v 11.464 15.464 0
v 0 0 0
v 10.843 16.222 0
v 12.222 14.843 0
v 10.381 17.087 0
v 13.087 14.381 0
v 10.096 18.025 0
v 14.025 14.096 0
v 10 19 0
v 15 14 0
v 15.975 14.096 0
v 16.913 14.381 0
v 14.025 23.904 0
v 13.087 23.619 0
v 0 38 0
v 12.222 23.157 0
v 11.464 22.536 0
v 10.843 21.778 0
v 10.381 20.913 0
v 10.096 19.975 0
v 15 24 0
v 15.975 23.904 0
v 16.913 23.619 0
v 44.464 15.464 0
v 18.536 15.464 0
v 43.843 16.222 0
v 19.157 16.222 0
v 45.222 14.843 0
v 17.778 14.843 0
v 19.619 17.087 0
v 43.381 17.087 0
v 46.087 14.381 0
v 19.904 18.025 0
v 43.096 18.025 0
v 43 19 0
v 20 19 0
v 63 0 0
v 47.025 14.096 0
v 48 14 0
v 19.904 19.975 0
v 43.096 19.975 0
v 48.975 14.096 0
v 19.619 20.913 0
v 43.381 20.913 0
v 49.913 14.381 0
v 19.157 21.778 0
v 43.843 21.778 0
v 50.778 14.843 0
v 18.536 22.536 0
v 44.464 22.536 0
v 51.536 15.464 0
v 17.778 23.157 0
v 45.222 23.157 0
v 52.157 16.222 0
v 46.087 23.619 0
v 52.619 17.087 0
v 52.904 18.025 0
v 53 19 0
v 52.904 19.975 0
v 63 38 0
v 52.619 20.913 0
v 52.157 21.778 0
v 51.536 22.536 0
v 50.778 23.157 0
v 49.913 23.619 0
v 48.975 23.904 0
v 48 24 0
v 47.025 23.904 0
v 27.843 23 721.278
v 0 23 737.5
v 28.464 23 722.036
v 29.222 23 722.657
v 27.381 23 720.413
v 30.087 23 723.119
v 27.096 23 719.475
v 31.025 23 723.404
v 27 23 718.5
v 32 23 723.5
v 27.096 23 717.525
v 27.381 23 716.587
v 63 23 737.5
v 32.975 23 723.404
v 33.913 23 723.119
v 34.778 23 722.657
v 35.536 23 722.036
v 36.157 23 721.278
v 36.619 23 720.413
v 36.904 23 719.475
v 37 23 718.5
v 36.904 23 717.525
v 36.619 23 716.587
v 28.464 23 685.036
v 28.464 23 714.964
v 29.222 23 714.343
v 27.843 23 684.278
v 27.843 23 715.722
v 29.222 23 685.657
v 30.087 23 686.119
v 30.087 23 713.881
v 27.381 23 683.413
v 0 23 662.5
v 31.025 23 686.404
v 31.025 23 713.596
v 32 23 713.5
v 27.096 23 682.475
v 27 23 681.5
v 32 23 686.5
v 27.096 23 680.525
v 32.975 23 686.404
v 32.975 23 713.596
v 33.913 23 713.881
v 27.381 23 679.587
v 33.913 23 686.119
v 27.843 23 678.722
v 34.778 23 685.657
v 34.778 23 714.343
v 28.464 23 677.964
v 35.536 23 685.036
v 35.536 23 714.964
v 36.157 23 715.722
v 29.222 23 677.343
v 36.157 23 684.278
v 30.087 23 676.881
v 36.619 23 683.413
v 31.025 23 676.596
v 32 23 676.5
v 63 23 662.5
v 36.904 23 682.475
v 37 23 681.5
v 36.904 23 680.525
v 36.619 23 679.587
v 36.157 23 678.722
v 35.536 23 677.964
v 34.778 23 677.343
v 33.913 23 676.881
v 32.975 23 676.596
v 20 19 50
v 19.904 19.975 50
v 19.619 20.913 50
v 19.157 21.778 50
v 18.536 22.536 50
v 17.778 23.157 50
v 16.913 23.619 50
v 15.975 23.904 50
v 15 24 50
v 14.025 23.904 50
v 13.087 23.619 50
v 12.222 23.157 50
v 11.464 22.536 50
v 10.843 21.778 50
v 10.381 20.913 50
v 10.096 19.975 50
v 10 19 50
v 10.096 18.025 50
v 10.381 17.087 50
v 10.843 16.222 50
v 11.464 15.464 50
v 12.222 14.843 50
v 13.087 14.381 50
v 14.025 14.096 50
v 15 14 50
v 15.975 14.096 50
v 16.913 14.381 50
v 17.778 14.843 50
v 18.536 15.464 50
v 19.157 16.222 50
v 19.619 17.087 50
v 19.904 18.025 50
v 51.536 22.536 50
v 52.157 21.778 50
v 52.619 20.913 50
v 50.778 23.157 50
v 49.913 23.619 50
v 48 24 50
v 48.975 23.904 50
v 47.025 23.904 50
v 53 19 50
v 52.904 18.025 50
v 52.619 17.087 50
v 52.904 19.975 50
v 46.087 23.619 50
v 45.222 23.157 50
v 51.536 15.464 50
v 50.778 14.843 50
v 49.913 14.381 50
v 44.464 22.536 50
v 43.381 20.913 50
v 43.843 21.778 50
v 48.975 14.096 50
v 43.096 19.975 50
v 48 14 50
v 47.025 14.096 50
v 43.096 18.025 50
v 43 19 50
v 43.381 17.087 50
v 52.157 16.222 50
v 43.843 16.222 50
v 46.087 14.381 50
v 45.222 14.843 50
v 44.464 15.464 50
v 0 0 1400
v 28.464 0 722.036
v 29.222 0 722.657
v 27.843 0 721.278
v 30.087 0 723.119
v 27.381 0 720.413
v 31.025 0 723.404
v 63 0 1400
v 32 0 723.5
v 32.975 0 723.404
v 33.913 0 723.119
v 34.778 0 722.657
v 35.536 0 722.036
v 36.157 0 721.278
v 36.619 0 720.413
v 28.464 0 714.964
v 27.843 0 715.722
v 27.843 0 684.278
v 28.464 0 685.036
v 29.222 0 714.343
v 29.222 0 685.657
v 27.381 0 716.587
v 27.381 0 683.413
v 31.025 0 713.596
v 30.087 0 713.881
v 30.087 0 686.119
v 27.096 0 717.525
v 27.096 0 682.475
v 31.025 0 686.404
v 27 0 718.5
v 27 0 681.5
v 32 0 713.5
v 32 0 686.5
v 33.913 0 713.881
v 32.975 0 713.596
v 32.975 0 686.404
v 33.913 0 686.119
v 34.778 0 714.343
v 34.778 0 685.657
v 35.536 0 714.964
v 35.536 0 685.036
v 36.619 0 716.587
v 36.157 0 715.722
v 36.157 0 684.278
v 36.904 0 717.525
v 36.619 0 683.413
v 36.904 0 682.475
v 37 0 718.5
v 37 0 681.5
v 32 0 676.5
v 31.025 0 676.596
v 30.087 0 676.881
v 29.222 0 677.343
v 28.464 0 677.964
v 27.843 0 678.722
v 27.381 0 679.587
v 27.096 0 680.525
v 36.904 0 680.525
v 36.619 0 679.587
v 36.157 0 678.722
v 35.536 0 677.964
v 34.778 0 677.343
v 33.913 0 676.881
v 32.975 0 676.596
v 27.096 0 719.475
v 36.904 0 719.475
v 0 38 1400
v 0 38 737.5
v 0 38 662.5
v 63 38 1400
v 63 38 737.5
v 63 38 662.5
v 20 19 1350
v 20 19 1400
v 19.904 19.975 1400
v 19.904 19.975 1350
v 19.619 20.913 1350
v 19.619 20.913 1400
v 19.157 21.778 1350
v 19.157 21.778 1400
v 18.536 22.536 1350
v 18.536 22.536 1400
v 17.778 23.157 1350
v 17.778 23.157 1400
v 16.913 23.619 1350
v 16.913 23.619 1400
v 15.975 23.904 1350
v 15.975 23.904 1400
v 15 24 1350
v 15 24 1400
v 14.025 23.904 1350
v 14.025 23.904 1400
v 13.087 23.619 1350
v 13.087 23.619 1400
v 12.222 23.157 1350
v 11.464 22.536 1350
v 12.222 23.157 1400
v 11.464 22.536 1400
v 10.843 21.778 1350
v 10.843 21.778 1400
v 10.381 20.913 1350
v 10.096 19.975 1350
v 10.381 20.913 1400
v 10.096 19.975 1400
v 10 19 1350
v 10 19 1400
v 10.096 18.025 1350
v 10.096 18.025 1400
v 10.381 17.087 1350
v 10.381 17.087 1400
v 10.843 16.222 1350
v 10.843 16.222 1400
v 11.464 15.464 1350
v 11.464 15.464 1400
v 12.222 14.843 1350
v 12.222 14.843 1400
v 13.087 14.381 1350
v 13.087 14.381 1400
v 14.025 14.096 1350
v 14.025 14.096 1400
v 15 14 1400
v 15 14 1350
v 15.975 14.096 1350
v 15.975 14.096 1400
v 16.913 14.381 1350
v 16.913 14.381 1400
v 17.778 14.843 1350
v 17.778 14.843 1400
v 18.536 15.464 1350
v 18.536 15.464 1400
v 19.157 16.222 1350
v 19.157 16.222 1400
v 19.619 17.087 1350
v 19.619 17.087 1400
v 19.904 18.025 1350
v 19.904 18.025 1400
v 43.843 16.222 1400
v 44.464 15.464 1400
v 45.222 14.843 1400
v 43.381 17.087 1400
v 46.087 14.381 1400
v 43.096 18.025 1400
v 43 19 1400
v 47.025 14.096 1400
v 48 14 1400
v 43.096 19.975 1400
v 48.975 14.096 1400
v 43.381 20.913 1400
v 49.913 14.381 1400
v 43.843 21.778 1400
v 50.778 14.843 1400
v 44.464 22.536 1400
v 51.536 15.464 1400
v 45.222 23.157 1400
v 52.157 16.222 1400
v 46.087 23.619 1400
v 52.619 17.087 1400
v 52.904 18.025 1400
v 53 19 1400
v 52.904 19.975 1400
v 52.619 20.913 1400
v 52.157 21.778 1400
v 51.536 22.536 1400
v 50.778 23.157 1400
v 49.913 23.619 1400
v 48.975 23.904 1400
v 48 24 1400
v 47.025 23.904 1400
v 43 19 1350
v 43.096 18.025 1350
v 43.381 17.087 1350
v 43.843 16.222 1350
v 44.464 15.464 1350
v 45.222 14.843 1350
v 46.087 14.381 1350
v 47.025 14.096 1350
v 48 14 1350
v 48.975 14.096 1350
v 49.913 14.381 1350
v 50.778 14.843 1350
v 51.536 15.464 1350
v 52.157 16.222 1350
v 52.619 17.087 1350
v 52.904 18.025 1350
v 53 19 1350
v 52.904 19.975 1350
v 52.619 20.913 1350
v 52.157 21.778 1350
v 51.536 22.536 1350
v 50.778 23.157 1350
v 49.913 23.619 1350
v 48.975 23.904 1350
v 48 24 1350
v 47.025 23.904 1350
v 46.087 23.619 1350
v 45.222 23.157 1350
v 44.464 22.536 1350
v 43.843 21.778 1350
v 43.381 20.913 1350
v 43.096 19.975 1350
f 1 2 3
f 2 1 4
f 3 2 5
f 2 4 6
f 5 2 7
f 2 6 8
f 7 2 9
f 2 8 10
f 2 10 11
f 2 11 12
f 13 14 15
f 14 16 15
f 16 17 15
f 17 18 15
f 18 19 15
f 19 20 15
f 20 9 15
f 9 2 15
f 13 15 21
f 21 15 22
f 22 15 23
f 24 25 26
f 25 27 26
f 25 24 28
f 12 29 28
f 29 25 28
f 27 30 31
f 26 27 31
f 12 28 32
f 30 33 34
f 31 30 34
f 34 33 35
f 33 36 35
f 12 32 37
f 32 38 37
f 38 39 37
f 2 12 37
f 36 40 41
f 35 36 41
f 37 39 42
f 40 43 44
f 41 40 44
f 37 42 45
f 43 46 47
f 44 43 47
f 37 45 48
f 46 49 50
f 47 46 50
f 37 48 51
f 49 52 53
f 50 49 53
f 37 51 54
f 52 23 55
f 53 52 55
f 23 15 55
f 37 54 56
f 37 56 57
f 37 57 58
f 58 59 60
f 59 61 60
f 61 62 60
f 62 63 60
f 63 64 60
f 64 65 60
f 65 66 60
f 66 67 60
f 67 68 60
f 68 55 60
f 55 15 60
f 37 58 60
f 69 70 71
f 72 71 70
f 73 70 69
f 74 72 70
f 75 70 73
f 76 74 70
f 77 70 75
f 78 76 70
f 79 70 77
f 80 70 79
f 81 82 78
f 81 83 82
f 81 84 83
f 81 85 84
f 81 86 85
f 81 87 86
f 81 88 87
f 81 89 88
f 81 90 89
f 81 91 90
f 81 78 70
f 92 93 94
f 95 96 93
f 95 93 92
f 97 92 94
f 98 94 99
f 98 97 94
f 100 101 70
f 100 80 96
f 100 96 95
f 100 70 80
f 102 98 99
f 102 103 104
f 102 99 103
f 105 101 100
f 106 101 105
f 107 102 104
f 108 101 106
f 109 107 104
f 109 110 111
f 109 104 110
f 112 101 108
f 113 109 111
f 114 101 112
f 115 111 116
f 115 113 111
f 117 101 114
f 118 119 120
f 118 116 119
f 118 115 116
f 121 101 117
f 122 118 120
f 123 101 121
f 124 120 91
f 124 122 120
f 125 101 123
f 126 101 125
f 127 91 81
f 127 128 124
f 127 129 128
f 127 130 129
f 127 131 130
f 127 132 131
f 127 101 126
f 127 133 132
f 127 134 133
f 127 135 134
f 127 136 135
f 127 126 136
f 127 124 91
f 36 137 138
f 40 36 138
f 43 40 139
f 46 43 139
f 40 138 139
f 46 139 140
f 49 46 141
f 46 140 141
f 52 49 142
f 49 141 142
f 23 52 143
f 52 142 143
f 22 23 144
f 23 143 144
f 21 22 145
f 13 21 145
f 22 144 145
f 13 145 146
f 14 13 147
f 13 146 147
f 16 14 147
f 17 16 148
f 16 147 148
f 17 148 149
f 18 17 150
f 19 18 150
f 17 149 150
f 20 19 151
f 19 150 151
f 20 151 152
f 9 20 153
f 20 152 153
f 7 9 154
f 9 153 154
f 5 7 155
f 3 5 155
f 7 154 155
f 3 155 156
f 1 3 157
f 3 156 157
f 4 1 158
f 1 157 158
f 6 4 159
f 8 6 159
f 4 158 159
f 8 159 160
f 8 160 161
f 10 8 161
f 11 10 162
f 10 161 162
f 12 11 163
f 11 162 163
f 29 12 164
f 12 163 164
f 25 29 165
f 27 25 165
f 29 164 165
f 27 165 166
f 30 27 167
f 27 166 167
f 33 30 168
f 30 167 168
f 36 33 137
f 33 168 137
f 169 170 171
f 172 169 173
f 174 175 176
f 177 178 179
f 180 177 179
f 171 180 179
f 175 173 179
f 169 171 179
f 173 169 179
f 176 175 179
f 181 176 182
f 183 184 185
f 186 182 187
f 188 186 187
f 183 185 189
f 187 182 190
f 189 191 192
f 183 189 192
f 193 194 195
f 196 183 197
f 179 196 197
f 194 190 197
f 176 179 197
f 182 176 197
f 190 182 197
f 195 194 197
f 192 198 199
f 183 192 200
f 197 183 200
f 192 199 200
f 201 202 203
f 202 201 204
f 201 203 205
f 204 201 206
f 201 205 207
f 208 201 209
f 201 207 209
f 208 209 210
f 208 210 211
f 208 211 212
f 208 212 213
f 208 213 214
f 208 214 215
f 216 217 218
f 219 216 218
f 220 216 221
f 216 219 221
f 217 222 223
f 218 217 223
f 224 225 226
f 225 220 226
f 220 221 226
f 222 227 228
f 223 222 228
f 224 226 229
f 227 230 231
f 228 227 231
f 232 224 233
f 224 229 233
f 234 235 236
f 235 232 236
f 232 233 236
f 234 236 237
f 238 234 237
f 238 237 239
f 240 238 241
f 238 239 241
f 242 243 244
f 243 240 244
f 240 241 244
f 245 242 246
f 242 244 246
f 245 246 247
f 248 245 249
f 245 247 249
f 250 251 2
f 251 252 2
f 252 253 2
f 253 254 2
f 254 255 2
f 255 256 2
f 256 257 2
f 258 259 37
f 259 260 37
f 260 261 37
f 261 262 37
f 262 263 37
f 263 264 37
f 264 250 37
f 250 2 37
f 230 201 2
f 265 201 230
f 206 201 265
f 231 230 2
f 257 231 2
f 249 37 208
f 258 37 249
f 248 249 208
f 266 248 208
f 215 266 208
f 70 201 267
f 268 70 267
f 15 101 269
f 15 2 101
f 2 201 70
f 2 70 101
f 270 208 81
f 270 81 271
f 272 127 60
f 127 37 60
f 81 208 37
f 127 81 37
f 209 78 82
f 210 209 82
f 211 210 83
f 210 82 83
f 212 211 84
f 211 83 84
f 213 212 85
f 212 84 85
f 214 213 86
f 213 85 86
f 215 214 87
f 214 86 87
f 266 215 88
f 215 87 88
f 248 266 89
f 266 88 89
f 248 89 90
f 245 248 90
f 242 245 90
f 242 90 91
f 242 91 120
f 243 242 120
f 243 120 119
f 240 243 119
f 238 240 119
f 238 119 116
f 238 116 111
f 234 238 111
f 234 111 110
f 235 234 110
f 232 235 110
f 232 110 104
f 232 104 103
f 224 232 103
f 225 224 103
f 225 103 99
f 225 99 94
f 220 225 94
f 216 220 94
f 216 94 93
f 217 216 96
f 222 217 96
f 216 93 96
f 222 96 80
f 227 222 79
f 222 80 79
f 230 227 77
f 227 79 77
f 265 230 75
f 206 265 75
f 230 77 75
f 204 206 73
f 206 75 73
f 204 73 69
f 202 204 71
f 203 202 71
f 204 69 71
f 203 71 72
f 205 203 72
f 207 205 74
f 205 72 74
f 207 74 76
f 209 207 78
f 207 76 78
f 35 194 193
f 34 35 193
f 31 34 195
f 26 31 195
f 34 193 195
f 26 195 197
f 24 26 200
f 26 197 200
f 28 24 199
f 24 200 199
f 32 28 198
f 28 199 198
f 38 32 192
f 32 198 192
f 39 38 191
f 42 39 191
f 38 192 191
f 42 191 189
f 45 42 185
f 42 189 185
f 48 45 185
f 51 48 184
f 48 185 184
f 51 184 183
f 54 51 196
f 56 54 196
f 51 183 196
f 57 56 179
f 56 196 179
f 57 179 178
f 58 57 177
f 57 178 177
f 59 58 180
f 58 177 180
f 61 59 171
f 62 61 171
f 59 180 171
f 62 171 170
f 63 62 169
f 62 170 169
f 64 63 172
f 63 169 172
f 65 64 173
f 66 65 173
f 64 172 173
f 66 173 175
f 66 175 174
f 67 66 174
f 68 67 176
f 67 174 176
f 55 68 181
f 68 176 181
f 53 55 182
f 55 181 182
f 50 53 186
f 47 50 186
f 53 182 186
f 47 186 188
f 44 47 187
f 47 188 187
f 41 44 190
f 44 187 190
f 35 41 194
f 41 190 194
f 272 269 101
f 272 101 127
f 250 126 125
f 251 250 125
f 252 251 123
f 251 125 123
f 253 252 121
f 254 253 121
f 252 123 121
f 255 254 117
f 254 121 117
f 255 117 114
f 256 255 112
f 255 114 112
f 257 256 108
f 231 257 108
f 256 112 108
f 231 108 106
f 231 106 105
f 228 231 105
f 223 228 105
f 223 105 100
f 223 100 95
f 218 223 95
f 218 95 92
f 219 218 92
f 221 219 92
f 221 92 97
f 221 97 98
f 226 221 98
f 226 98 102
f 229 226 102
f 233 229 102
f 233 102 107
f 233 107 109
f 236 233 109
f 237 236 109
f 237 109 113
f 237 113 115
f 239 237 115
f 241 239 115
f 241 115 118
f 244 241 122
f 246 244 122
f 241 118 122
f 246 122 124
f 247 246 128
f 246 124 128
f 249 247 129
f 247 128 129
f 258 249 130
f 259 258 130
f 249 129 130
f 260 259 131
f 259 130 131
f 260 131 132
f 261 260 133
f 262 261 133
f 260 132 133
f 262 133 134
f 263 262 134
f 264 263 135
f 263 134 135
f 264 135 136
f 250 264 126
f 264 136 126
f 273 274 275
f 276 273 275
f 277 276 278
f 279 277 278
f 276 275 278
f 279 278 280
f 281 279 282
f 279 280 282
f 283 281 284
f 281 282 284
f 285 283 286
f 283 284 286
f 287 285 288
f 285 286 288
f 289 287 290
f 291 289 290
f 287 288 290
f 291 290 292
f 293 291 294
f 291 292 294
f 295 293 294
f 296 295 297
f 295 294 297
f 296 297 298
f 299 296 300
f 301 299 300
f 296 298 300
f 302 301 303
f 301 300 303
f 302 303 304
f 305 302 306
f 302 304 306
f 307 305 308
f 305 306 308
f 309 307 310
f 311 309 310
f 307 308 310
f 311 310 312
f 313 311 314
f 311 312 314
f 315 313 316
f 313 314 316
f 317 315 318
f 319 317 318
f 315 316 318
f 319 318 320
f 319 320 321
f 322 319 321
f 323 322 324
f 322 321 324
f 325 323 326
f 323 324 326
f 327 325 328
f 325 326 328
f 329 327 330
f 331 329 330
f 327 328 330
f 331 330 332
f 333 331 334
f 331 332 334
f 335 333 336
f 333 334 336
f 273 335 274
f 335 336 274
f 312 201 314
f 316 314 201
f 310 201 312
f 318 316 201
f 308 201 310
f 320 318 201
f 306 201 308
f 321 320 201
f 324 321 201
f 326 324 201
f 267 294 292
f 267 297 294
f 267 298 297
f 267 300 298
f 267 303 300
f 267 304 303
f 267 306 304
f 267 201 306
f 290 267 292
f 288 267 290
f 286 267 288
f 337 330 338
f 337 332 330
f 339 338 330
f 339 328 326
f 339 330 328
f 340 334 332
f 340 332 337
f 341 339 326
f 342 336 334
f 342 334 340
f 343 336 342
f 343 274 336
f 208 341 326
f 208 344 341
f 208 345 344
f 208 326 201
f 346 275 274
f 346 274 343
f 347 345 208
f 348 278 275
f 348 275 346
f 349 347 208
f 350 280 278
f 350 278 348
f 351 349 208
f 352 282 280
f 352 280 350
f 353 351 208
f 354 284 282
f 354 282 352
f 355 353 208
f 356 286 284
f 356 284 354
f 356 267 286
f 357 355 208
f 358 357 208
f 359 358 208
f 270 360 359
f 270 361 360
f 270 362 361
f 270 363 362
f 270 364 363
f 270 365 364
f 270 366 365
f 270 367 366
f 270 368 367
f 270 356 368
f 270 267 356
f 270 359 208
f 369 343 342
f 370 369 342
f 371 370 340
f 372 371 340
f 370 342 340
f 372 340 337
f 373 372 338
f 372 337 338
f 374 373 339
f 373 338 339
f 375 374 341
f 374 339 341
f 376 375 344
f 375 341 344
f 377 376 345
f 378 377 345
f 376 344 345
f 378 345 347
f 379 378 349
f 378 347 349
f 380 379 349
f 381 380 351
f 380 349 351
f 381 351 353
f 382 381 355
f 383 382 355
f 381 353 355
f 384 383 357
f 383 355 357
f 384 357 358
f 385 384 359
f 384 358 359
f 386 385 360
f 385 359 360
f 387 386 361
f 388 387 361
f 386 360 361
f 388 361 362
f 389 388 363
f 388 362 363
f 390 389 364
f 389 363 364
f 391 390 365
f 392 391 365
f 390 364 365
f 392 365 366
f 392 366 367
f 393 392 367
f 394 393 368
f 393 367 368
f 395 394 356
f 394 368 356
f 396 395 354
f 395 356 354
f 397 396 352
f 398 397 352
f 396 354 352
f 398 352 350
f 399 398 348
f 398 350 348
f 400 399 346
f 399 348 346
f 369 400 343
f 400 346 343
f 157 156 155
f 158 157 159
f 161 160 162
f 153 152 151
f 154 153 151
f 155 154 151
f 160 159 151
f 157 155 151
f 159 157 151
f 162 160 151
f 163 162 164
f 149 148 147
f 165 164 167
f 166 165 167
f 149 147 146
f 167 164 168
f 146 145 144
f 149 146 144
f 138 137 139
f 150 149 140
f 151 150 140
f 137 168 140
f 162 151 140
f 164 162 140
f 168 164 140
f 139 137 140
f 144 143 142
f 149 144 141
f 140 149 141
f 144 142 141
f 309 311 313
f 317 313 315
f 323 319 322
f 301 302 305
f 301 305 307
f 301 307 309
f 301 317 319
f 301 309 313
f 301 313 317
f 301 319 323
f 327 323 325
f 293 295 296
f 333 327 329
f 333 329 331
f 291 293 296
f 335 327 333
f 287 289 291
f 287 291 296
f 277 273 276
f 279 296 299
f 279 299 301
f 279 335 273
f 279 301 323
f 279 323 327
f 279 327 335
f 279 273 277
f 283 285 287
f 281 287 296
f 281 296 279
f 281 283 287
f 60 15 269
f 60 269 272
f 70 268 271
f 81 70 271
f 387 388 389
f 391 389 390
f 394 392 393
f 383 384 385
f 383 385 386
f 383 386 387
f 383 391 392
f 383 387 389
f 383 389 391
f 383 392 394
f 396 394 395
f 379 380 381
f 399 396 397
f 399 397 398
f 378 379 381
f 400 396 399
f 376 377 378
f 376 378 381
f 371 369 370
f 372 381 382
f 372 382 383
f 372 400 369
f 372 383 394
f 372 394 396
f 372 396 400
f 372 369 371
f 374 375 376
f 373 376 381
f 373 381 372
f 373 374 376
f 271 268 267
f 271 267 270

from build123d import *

# Parameters (mm, degrees)
ESQUISSE1_W             = 63
ESQUISSE1_H             = 38
BOSS_EXTRU_1_DEPTH      = 1400
ESQUISSE2_R             = 5
ENL_V_MAT_EXTRU_1_DEPTH = 50
ENL_V_START             = -1350
ESQUISSE2_2_R           = 5
ENL_V_MAT_EXTRU_2_DEPTH = 50
ESQUISSE3_W             = 63
ESQUISSE3_H             = 75
ENL_V_MAT_EXTRU_3_DEPTH = 15
ESQUISSE4_R             = 5
ENL_V_MAT_EXTRU_4_DEPTH = 1402.60550798


with BuildPart() as part:
    # Esquisse1 → Boss.-Extru.1 (new body)
    with BuildSketch(Plane.XY):
        with Locations((31.5, 19)):
            Rectangle(ESQUISSE1_W, ESQUISSE1_H)
    extrude(amount=BOSS_EXTRU_1_DEPTH)

    # Esquisse2 → Enlèv. mat.-Extru.1 (cut)
    with BuildSketch(Plane.XY.offset(1400)):
        with Locations((15, 19)):
            Circle(ESQUISSE2_R)
        with Locations(Location((48, 19, 0), (0, 0, 180))):
            Circle(ESQUISSE2_R)
    extrude(amount=-ENL_V_MAT_EXTRU_1_DEPTH, mode=Mode.SUBTRACT)

    # Esquisse2<2> → Enlèv. mat.-Extru.2 (cut)
    with BuildSketch(Plane.XY.offset(1400).offset(ENL_V_START)):
        with Locations((15, 19)):
            Circle(ESQUISSE2_2_R)
        with Locations(Location((48, 19, 0), (0, 0, 180))):
            Circle(ESQUISSE2_2_R)
    extrude(amount=-ENL_V_MAT_EXTRU_2_DEPTH, mode=Mode.SUBTRACT)

    # Esquisse3 → Enlèv. mat.-Extru.3 (cut)
    with BuildSketch(Plane(origin=(0, 38, 0), x_dir=(1, 0, 0), z_dir=(0, 1, 0))):
        with Locations((31.5, -700)):
            Rectangle(ESQUISSE3_W, ESQUISSE3_H)
    extrude(amount=-ENL_V_MAT_EXTRU_3_DEPTH, mode=Mode.SUBTRACT)

    # Esquisse4 → Enlèv. mat.-Extru.4 (cut, through all)
    with BuildSketch(Plane(origin=(0, 23, 0), x_dir=(1, 0, 0), z_dir=(0, 1, 0))):
        with Locations(Location((32, -718.5, 0), (0, 0, 270))):
            Circle(ESQUISSE4_R)
        with Locations(Location((32, -681.5, 0), (0, 0, 90))):
            Circle(ESQUISSE4_R)
    extrude(amount=-ENL_V_MAT_EXTRU_4_DEPTH, mode=Mode.SUBTRACT)


solid = part.part
